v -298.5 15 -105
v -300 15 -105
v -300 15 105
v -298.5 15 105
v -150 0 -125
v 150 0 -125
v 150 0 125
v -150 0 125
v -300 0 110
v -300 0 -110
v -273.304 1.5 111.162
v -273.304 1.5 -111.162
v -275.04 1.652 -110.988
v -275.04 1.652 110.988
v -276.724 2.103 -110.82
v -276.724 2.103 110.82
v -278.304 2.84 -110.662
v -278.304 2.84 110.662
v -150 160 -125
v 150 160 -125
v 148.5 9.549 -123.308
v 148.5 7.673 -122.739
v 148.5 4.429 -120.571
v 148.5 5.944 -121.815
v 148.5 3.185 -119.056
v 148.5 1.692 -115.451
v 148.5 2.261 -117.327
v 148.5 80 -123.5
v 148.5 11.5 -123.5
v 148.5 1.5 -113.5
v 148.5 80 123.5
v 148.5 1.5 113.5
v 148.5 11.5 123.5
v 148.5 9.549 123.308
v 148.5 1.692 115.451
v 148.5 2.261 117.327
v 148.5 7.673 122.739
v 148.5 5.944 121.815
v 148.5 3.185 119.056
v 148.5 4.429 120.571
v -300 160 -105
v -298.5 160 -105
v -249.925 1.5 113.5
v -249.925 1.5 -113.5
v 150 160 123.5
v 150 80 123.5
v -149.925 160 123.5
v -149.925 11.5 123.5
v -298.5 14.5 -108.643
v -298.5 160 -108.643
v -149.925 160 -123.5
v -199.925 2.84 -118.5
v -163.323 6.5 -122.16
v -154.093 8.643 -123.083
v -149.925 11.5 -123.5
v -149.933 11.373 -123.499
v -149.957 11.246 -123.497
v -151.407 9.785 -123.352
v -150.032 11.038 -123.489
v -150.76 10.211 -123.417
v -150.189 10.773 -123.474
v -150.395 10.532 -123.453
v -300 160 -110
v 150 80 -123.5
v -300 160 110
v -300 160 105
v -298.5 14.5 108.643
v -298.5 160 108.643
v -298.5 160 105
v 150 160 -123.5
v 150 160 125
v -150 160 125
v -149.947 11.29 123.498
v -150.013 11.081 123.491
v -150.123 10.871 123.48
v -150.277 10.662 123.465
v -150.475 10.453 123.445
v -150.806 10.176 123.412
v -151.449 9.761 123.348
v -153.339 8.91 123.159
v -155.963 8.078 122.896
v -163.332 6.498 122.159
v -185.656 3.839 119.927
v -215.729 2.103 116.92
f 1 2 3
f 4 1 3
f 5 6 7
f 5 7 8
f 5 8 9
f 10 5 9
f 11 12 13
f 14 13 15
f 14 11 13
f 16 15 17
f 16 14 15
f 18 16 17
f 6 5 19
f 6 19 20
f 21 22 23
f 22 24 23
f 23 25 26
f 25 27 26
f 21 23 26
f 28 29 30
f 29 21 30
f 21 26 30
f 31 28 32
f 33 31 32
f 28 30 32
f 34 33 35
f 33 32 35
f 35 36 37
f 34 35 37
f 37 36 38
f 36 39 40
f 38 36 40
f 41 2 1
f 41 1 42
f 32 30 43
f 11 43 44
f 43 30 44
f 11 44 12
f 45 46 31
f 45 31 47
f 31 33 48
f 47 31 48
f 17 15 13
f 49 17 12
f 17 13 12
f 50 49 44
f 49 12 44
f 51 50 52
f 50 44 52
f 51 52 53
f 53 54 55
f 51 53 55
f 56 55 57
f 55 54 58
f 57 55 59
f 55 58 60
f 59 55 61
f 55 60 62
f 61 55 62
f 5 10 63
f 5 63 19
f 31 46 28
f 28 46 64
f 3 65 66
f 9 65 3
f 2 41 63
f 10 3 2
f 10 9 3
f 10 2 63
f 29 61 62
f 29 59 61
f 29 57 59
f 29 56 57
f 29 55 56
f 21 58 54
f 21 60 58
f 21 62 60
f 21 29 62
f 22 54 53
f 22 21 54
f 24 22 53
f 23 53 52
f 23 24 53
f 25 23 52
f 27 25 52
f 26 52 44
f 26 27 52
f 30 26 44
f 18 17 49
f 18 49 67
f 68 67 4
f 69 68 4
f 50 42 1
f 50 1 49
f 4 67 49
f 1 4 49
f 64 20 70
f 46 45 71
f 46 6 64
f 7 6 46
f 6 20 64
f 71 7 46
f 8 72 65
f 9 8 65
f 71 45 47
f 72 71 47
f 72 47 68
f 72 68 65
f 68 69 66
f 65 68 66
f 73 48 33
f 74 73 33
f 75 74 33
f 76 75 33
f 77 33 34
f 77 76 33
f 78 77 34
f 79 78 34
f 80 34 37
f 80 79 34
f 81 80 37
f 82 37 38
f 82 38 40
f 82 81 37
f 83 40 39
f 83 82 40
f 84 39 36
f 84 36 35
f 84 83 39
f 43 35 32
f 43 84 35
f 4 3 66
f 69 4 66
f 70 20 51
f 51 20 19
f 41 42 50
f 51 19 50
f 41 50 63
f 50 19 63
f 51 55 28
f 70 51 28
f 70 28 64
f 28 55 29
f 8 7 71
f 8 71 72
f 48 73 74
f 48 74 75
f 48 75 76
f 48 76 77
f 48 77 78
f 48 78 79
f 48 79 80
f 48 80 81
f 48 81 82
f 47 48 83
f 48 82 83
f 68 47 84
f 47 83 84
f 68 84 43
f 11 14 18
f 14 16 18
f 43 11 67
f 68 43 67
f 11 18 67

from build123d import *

# Parameters (mm, degrees)
EXTRUDE_1_DEPTH     = 160
SHELL_1_T           = -1.5
SKETCH_2_W          = 210
SKETCH_2_H          = 185
CUT_EXTRUDE_1_DEPTH = 200
CHAMFER_1_SIZE      = 13
CHAMFER_1_SIZE2     = 22.516660498
SKETCH_6_W          = 247
SKETCH_6_H          = 80
CUT_EXTRUDE_2_DEPTH = 200
FILLET_1_R          = 10
FILLET_2_R          = 10


with BuildPart() as part:
    # 草图1 → 凸台-拉伸1 (new body)
    with BuildSketch(Plane(origin=(0, 0, 0), x_dir=(1, 0, 0), z_dir=(0, 1, 0))):
        Polygon((-150, 125), (150, 125), (150, -125), (-150, -125), (-300, -110), (-300, 110), align=None)
    extrude(amount=EXTRUDE_1_DEPTH)

    # 抽壳1
    shell_1_openings = [part.faces().sort_by_distance(p)[0] for p in [
        (-71.428571429, 160, 0),
    ]]
    offset(amount=SHELL_1_T, openings=shell_1_openings, kind=Kind.INTERSECTION)

    # 草图2 → 切除-拉伸1 (cut)
    with BuildSketch(Plane.ZY.offset(300)):
        with Locations((0, 107.5)):
            Rectangle(SKETCH_2_W, SKETCH_2_H)
    extrude(amount=-CUT_EXTRUDE_1_DEPTH, mode=Mode.SUBTRACT)

    # 倒角1
    chamfer_1_edges = [part.edges().sort_by_distance(p)[0] for p in [
        (-298.5, 1.5, 0),
    ]]
    chamfer_1_side = [part.faces().sort_by_distance(p)[0] for p in [
        (-298.5, 80.75, 105.953001276),
    ]]
    chamfer(chamfer_1_edges, length=CHAMFER_1_SIZE, length2=CHAMFER_1_SIZE2, reference=chamfer_1_side[0])

    # 草图6 → 切除-拉伸2 (cut)
    with BuildSketch(Plane(origin=(150, 0, 0), x_dir=(0, 0, -1), z_dir=(1, 0, 0))):
        with Locations((0, 120)):
            Rectangle(SKETCH_6_W, SKETCH_6_H)
    extrude(amount=-CUT_EXTRUDE_2_DEPTH, mode=Mode.SUBTRACT)

    # 圆角1
    fillet_1_edges = [part.edges().sort_by_distance(p)[0] for p in [
        (-275.983339502, 1.5, 0),
    ]]
    fillet(fillet_1_edges, radius=FILLET_1_R)

    # 圆角2
    # the kernel refuses this fillet: 10 mm, written as the material it adds along each edge
    with BuildSketch(Plane(origin=(148.5, 1.5, -123.5), x_dir=(0, 0, 1), z_dir=(-1, 0, 0))) as fillet_2_piece_1_section:
        with BuildLine():
            CenterArc((FILLET_2_R, FILLET_2_R), FILLET_2_R, 180, 90)
            Line((0, FILLET_2_R), (0, 0))
            Line((0, 0), (FILLET_2_R, 0))
        make_face()
    fillet_2_piece_1 = extrude(amount=423.425186568, mode=Mode.PRIVATE)
    fillet_2_piece_1 = split(fillet_2_piece_1, bisect_by=Plane(origin=(145.545295182, 1.5, -153.047048175), z_dir=(0.09950371902099917, 0, 0.9950371902099892)), keep=Keep.TOP, mode=Mode.PRIVATE)
    add(fillet_2_piece_1)
    with BuildSketch(Plane(origin=(-274.925186568, 1.5, 123.5), x_dir=(0, 0, -1), z_dir=(1, 0, 0))) as fillet_2_piece_2_section:
        with BuildLine():
            CenterArc((FILLET_2_R, FILLET_2_R), FILLET_2_R, 180, 90)
            Line((0, FILLET_2_R), (0, 0))
            Line((0, 0), (FILLET_2_R, 0))
        make_face()
    fillet_2_piece_2 = extrude(amount=423.425186568, mode=Mode.PRIVATE)
    fillet_2_piece_2 = split(fillet_2_piece_2, bisect_by=Plane(origin=(-273.687562806, 1.5, 111.123762376), z_dir=(0.09950371902099844, 0, -0.9950371902099893)), keep=Keep.TOP, mode=Mode.PRIVATE)
    add(fillet_2_piece_2)


solid = part.part
